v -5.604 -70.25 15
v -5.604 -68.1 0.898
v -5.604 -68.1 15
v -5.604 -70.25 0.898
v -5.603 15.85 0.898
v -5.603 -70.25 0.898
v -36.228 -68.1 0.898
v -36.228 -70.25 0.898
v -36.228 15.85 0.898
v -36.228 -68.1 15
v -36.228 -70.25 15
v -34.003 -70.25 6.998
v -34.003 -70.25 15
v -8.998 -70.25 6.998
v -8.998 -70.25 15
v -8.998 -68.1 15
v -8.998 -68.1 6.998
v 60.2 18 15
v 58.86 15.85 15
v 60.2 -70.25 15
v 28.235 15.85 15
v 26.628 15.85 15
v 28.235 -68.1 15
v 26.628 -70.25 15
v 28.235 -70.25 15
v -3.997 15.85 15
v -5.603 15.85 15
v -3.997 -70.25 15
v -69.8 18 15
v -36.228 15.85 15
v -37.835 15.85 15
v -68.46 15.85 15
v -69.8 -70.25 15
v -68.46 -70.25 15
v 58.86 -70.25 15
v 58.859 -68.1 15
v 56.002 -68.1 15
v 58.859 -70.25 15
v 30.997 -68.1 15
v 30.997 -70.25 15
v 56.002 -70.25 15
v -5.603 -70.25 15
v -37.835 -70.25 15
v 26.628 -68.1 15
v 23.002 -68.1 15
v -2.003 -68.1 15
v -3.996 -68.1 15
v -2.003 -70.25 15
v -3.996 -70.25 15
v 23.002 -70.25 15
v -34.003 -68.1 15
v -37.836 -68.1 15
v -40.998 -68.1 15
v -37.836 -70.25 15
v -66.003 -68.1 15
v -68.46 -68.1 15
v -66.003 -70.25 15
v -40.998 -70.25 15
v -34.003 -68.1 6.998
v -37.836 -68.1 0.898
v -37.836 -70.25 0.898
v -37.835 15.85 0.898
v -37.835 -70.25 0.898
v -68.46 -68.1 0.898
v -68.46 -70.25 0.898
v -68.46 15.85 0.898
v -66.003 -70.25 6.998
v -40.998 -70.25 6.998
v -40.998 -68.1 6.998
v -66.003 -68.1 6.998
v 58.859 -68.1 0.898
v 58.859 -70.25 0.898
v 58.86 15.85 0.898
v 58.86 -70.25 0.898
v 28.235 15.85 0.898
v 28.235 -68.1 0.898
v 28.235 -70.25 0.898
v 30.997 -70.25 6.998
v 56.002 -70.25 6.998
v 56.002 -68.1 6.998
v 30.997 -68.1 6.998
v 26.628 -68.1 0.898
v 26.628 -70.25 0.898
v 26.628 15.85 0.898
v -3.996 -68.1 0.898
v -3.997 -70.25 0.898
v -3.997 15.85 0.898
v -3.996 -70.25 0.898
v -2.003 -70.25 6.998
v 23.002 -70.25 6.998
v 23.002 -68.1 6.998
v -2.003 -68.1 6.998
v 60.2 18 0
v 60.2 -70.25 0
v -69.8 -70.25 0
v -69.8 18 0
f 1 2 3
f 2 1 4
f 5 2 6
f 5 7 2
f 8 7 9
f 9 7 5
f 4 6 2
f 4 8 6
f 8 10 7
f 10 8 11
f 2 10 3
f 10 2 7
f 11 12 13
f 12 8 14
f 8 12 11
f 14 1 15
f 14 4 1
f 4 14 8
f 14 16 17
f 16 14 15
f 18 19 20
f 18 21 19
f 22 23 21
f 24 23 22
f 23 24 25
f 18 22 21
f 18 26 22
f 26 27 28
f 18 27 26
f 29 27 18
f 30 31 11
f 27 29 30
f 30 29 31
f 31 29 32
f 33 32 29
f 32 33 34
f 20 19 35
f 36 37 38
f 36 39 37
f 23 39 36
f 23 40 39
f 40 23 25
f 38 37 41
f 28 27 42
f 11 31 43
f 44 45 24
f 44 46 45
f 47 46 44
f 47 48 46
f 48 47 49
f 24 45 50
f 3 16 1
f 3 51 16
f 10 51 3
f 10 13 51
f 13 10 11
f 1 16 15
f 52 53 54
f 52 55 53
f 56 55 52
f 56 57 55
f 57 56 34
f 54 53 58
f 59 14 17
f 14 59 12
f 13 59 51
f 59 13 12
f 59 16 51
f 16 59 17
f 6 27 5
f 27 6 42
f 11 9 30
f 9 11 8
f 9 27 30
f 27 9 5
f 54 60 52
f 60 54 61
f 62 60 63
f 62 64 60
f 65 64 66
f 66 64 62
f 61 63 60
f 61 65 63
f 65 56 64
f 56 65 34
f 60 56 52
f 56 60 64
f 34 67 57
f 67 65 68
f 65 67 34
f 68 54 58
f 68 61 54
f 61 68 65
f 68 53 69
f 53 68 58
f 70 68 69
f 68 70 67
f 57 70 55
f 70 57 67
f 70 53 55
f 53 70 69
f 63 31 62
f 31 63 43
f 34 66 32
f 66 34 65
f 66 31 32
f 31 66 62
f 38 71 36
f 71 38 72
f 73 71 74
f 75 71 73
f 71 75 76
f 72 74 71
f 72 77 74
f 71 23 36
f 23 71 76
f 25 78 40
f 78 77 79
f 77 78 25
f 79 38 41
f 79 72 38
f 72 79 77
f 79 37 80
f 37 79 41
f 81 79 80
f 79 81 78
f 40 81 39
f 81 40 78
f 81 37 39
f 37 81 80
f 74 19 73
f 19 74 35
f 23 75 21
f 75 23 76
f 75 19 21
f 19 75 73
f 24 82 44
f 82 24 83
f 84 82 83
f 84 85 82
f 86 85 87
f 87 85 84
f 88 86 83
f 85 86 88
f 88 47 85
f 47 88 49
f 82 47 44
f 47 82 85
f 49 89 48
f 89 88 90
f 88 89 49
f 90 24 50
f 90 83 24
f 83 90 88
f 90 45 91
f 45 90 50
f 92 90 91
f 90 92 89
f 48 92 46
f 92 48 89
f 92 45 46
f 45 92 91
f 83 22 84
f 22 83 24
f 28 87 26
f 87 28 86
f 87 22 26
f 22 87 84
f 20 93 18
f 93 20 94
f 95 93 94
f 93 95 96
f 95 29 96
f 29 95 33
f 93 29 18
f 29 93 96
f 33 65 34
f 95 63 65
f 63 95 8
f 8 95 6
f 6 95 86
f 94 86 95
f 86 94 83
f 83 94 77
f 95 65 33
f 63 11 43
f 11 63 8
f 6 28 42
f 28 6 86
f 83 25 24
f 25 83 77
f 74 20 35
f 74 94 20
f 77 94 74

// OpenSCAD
difference() {
  translate([-4.7999900000, -26.1250005000, 7.5000000000]) {
    scale([130.0000000000, 88.2500000000, 15.0000000000]) {
      translate([-0.5000000000, -0.5000000000, -0.5000000000]) {
        cube([1, 1, 1]);
      }
    }
  }
  union() {
    union() {
      union() {
        difference() {
          translate([-20.9155734375, -27.2000232000, 7.9490076039]) {
            rotate([0.0000000000, 0.0000000000, 0.0000000000]) {
              scale([30.6250000000, 86.1000000000, 14.1020000000]) {
                translate([-0.5000000000, -0.5000000000, -0.5000000000]) {
                  cube([1, 1, 1]);
                }
              }
            }
          }
          difference() {
            translate([-20.9159470080, -69.1749600000, 7.9490076039]) {
              scale([30.6240000000, 2.1500000000, 14.1020000000]) {
                translate([-0.5000000000, -0.5000000000, -0.5000000000]) {
                  cube([1, 1, 1]);
                }
              }
            }
            translate([-21.5005000000, -69.1750000000, 10.9990000000]) {
              rotate([0.0000000000, 0.0000000000, 0.0000000000]) {
                scale([25.0050000000, 2.1500000000, 8.0020000000]) {
                  translate([-0.5000000000, -0.5000000000, -0.5000000000]) {
                    cube([1, 1, 1]);
                  }
                }
              }
            }
          }
        }
        difference() {
          translate([-53.1475437500, -27.2000232000, 7.9490076039]) {
            rotate([0.0000000000, 0.0000000000, 0.0000000000]) {
              scale([30.6250000000, 86.1000000000, 14.1020000000]) {
                translate([-0.5000000000, -0.5000000000, -0.5000000000]) {
                  cube([1, 1, 1]);
                }
              }
            }
          }
          difference() {
            translate([-53.1479520000, -69.1749600000, 7.9490076039]) {
              scale([30.6240000000, 2.1500000000, 14.1020000000]) {
                translate([-0.5000000000, -0.5000000000, -0.5000000000]) {
                  cube([1, 1, 1]);
                }
              }
            }
            translate([-53.5005000000, -69.1750000000, 10.9990000000]) {
              rotate([0.0000000000, 0.0000000000, 0.0000000000]) {
                scale([25.0050000000, 2.1500000000, 8.0020000000]) {
                  translate([-0.5000000000, -0.5000000000, -0.5000000000]) {
                    cube([1, 1, 1]);
                  }
                }
              }
            }
          }
        }
      }
      difference() {
        translate([43.5475096875, -27.2000232000, 7.9490076039]) {
          rotate([0.0000000000, 0.0000000000, 0.0000000000]) {
            scale([30.6250000000, 86.1000000000, 14.1020000000]) {
              translate([-0.5000000000, -0.5000000000, -0.5000000000]) {
                cube([1, 1, 1]);
              }
            }
          }
        }
        difference() {
          translate([43.5470064480, -69.1749600000, 7.9490076039]) {
            scale([30.6240000000, 2.1500000000, 14.1020000000]) {
              translate([-0.5000000000, -0.5000000000, -0.5000000000]) {
                cube([1, 1, 1]);
              }
            }
          }
          translate([43.4995000000, -69.1750000000, 10.9990000000]) {
            rotate([0.0000000000, 0.0000000000, 0.0000000000]) {
              scale([25.0050000000, 2.1500000000, 8.0020000000]) {
                translate([-0.5000000000, -0.5000000000, -0.5000000000]) {
                  cube([1, 1, 1]);
                }
              }
            }
          }
        }
      }
    }
    difference() {
      translate([11.3155087500, -27.2000232000, 7.9490076039]) {
        rotate([0.0000000000, 0.0000000000, 0.0000000000]) {
          scale([30.6250000000, 86.1000000000, 14.1020000000]) {
            translate([-0.5000000000, -0.5000000000, -0.5000000000]) {
              cube([1, 1, 1]);
            }
          }
        }
      }
      difference() {
        translate([11.3159967360, -69.1749600000, 7.9490076039]) {
          scale([30.6240000000, 2.1500000000, 14.1020000000]) {
            translate([-0.5000000000, -0.5000000000, -0.5000000000]) {
              cube([1, 1, 1]);
            }
          }
        }
        translate([10.4995000000, -69.1750000000, 10.9990000000]) {
          rotate([0.0000000000, 0.0000000000, 0.0000000000]) {
            scale([25.0050000000, 2.1500000000, 8.0020000000]) {
              translate([-0.5000000000, -0.5000000000, -0.5000000000]) {
                cube([1, 1, 1]);
              }
            }
          }
        }
      }
    }
  }
}
